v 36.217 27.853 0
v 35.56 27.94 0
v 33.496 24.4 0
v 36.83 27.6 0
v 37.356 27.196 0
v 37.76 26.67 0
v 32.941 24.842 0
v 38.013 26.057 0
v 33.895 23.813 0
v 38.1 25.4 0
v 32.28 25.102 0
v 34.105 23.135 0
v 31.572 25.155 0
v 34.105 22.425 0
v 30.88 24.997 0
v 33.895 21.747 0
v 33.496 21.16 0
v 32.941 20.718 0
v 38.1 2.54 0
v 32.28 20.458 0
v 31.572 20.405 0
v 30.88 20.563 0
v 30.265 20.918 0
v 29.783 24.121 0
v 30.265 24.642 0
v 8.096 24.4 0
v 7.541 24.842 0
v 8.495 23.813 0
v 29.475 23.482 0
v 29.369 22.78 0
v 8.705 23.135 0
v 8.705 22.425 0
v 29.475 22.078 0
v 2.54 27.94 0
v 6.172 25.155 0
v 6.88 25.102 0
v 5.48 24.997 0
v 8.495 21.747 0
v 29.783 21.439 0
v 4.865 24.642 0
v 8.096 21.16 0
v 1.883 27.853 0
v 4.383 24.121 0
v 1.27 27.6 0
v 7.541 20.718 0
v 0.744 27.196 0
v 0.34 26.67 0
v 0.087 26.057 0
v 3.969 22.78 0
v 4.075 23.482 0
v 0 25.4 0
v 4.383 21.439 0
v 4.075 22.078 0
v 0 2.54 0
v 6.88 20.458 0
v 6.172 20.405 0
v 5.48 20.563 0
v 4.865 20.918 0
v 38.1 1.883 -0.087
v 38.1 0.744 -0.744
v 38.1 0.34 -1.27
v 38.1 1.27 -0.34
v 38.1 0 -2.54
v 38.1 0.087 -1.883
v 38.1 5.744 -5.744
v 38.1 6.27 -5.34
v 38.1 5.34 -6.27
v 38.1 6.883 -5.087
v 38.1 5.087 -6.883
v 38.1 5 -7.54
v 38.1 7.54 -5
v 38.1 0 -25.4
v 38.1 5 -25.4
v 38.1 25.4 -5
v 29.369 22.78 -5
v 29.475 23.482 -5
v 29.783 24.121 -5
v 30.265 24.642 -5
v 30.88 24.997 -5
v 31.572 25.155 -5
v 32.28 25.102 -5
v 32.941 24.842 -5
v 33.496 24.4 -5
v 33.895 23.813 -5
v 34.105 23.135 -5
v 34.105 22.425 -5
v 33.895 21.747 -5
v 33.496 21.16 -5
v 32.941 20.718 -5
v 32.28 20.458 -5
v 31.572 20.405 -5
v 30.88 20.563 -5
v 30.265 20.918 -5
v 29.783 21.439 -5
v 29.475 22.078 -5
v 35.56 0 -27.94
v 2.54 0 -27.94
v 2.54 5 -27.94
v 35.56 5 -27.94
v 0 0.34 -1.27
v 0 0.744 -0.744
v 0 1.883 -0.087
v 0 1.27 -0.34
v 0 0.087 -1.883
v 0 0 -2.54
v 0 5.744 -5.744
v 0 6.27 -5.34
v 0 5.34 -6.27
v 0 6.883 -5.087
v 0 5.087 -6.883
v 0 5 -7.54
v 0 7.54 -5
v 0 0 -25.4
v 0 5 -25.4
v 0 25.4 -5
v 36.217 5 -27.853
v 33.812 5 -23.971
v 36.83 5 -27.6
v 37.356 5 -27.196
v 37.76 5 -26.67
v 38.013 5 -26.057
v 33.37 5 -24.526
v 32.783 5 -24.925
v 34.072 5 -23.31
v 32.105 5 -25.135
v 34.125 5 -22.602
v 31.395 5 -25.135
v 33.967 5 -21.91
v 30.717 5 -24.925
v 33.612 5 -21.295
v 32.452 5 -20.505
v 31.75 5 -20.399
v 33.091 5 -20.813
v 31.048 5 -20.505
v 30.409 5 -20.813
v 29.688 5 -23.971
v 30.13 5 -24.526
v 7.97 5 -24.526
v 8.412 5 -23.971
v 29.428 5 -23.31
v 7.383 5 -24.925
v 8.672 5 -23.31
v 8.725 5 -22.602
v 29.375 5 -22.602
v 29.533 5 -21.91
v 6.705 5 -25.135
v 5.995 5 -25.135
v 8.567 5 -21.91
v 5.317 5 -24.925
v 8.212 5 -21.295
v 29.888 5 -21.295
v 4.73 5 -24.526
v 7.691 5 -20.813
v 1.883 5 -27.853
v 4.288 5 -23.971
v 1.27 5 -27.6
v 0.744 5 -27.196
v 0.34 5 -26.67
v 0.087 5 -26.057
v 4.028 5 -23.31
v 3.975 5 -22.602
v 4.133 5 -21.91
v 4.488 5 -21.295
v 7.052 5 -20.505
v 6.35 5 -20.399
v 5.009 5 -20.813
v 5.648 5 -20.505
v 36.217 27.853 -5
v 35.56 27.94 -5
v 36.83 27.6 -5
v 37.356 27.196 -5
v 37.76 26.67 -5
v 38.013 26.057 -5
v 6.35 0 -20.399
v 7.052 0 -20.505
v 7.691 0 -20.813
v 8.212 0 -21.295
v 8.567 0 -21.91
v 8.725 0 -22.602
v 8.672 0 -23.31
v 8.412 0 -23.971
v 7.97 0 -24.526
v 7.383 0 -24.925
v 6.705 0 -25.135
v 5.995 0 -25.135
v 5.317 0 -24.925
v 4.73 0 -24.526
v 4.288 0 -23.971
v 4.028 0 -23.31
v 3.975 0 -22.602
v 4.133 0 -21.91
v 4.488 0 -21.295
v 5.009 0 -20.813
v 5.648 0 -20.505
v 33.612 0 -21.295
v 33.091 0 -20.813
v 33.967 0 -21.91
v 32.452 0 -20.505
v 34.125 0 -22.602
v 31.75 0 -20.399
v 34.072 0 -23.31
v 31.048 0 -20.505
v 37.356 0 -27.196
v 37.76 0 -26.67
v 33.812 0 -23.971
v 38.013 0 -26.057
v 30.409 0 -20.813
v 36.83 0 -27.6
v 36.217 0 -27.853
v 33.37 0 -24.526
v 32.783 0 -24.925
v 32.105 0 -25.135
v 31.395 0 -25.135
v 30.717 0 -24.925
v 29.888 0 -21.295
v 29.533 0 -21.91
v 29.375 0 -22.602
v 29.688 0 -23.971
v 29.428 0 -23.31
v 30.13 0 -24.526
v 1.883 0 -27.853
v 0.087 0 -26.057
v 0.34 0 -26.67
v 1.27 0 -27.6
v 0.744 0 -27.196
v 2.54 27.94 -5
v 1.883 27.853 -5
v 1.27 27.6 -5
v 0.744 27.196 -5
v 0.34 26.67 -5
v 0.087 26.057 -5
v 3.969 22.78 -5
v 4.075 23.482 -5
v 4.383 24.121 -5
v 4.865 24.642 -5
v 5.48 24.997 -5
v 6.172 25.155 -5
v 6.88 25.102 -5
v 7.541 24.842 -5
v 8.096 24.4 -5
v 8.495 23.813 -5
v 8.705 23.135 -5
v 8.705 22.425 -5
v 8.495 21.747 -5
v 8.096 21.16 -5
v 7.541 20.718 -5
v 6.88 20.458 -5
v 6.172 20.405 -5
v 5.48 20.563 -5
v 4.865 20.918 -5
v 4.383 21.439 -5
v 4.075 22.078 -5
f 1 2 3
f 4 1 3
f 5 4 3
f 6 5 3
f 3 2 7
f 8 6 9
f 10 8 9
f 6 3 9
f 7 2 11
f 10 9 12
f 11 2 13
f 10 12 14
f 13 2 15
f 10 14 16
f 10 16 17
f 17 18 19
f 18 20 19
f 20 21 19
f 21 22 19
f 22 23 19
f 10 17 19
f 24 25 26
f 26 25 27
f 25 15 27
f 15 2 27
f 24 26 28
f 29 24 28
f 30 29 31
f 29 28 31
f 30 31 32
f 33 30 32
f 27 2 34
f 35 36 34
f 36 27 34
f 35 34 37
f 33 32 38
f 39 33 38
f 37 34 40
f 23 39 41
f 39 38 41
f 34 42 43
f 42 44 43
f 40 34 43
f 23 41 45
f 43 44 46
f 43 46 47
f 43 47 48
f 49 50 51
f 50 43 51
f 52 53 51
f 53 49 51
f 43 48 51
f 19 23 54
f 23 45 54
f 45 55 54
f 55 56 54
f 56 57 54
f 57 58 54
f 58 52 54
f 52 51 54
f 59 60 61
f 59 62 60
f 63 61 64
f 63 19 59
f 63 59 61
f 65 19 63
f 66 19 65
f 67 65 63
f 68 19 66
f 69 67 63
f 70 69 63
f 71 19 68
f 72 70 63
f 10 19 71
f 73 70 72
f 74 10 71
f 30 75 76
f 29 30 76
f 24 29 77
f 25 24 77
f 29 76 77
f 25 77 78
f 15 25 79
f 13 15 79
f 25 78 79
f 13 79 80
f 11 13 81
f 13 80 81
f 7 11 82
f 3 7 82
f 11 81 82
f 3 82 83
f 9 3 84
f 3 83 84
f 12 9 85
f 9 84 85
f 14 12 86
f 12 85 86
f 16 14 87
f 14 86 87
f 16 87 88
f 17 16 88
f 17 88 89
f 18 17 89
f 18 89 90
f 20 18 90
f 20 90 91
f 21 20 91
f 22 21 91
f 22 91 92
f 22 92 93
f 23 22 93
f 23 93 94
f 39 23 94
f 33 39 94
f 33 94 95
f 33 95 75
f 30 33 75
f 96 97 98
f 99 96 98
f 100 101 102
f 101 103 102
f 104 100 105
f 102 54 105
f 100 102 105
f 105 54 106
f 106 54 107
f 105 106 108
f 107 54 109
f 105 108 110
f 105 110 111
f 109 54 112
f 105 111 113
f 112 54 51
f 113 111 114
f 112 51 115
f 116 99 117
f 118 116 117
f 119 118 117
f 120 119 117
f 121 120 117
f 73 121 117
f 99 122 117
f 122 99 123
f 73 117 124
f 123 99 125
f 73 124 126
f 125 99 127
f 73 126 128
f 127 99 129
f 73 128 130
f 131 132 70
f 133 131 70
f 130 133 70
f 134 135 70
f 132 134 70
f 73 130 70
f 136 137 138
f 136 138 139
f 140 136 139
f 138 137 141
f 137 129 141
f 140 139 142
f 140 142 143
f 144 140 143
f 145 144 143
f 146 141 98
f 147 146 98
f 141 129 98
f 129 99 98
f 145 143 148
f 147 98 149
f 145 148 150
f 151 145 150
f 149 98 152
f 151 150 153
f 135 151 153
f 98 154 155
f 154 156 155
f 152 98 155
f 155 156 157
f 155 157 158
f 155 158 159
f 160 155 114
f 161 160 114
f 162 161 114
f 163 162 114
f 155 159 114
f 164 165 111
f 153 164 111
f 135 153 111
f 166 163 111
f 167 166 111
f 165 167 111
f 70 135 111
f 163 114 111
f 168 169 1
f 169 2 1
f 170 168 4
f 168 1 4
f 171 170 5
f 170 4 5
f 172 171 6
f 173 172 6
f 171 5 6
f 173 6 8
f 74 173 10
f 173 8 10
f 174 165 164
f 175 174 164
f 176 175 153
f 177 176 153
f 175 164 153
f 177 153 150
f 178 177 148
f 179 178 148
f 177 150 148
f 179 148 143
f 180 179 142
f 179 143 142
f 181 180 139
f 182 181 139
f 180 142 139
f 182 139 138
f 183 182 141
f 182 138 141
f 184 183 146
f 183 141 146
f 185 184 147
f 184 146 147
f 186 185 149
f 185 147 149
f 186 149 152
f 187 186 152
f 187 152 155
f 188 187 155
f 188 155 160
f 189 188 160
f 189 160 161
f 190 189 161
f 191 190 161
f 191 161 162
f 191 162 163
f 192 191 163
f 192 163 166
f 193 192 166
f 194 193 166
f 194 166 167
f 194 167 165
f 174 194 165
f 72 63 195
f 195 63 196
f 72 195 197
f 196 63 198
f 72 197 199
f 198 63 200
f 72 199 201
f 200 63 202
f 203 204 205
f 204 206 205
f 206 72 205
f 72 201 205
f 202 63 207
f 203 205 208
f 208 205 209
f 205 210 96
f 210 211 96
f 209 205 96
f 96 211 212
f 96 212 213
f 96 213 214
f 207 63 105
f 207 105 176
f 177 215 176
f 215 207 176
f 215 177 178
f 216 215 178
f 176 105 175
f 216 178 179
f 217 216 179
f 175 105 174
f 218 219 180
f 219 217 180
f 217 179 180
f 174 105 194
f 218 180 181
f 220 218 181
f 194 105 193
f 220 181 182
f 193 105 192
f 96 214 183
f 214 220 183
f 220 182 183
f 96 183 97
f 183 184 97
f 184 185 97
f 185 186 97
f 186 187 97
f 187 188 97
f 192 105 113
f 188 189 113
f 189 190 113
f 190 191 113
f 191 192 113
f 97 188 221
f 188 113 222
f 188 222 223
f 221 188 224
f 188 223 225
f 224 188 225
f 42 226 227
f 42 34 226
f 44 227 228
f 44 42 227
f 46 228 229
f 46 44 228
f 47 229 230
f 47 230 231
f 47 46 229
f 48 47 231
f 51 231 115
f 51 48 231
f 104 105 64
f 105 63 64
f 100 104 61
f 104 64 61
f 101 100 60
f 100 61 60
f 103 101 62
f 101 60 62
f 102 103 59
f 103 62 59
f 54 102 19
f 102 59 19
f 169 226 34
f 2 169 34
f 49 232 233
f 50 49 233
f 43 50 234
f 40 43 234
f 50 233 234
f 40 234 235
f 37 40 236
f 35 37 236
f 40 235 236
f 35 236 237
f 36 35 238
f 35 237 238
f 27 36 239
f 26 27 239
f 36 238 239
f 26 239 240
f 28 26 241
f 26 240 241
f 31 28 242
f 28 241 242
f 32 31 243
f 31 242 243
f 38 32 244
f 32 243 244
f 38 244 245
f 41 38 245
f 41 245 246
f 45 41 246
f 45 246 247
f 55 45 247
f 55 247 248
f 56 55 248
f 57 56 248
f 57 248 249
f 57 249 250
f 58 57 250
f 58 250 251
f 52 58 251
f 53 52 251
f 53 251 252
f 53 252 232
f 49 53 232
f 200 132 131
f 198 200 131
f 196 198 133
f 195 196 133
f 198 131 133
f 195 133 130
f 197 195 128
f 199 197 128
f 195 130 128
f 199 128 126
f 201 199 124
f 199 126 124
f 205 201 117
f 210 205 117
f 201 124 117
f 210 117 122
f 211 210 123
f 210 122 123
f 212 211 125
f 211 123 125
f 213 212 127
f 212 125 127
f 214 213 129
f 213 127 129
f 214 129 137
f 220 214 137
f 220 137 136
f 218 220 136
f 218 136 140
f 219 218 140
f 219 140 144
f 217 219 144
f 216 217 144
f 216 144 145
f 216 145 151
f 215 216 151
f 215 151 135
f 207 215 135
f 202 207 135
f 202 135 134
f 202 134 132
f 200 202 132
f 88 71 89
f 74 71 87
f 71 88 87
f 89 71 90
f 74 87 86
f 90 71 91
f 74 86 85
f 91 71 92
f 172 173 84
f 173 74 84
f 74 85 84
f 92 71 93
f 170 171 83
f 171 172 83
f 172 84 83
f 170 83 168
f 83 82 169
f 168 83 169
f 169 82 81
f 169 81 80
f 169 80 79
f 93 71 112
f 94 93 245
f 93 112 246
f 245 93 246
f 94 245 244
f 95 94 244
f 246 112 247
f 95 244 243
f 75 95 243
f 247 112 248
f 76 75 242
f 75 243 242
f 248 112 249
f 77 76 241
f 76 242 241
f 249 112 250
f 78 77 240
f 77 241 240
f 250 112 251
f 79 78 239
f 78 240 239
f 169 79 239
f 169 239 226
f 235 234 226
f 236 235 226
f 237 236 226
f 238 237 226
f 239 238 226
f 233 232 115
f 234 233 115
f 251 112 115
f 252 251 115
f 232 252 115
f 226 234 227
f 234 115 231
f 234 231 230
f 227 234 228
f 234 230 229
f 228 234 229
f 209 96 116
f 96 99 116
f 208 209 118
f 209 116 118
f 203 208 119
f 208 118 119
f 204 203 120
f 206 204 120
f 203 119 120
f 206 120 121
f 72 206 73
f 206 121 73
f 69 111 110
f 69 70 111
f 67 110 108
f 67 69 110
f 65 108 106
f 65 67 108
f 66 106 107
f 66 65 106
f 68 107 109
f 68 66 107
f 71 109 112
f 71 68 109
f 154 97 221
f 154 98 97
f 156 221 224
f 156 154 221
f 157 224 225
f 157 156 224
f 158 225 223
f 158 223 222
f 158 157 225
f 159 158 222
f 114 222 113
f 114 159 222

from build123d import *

# Parameters (mm, degrees)
BOSS_EXTRUDE1_DEPTH            = 38.1
FILLET1_R                      = 2.54
SKETCH3_R                      = 2.38125
GUESS_OF_WHERE_HOLES_ARE_DEPTH = 53.521397544
SKETCH4_R                      = 2.38125
CUT_EXTRUDE2_DEPTH             = 53.521397544


with BuildPart() as part:
    # Sketch2 → Boss-Extrude1 (new body)
    with BuildSketch(Plane(origin=(0, 0, 0), x_dir=(0, 0, -1), z_dir=(1, 0, 0))):
        Polygon((0, 0), (27.94, 0), (27.94, 5), (5, 5), (5, 27.94), (0, 27.94), align=None)
    extrude(amount=BOSS_EXTRUDE1_DEPTH)

    # Fillet1
    fillet1_edges = [part.edges().sort_by_distance(p)[0] for p in [
        (19.05, 5, -5),
        (19.05, 0, 0),
        (38.1, 2.5, -27.94),
        (0, 2.5, -27.94),
        (0, 27.94, -2.5),
        (38.1, 27.94, -2.5),
    ]]
    fillet(fillet1_edges, radius=FILLET1_R)

    # Sketch3 → guess_of_where_holes_are (cut, through all)
    with BuildSketch(Plane(origin=(0, 0, -5), x_dir=(-1, 0, 0), z_dir=(0, 0, -1))):
        with Locations((-31.75, 22.78)):
            Circle(SKETCH3_R)
        with Locations((-6.35, 22.78)):
            Circle(SKETCH3_R)
    extrude(amount=-GUESS_OF_WHERE_HOLES_ARE_DEPTH, mode=Mode.SUBTRACT)

    # Sketch4 → Cut-Extrude2 (cut, through all)
    with BuildSketch(Plane(origin=(0, 5, 0), x_dir=(1, 0, 0), z_dir=(0, 1, 0))):
        with Locations(Location((31.75, 22.78, 0), (0, 0, 270))):
            Circle(SKETCH4_R)
        with Locations(Location((6.35, 22.78, 0), (0, 0, 270))):
            Circle(SKETCH4_R)
    extrude(amount=-CUT_EXTRUDE2_DEPTH, mode=Mode.SUBTRACT)


solid = part.part
